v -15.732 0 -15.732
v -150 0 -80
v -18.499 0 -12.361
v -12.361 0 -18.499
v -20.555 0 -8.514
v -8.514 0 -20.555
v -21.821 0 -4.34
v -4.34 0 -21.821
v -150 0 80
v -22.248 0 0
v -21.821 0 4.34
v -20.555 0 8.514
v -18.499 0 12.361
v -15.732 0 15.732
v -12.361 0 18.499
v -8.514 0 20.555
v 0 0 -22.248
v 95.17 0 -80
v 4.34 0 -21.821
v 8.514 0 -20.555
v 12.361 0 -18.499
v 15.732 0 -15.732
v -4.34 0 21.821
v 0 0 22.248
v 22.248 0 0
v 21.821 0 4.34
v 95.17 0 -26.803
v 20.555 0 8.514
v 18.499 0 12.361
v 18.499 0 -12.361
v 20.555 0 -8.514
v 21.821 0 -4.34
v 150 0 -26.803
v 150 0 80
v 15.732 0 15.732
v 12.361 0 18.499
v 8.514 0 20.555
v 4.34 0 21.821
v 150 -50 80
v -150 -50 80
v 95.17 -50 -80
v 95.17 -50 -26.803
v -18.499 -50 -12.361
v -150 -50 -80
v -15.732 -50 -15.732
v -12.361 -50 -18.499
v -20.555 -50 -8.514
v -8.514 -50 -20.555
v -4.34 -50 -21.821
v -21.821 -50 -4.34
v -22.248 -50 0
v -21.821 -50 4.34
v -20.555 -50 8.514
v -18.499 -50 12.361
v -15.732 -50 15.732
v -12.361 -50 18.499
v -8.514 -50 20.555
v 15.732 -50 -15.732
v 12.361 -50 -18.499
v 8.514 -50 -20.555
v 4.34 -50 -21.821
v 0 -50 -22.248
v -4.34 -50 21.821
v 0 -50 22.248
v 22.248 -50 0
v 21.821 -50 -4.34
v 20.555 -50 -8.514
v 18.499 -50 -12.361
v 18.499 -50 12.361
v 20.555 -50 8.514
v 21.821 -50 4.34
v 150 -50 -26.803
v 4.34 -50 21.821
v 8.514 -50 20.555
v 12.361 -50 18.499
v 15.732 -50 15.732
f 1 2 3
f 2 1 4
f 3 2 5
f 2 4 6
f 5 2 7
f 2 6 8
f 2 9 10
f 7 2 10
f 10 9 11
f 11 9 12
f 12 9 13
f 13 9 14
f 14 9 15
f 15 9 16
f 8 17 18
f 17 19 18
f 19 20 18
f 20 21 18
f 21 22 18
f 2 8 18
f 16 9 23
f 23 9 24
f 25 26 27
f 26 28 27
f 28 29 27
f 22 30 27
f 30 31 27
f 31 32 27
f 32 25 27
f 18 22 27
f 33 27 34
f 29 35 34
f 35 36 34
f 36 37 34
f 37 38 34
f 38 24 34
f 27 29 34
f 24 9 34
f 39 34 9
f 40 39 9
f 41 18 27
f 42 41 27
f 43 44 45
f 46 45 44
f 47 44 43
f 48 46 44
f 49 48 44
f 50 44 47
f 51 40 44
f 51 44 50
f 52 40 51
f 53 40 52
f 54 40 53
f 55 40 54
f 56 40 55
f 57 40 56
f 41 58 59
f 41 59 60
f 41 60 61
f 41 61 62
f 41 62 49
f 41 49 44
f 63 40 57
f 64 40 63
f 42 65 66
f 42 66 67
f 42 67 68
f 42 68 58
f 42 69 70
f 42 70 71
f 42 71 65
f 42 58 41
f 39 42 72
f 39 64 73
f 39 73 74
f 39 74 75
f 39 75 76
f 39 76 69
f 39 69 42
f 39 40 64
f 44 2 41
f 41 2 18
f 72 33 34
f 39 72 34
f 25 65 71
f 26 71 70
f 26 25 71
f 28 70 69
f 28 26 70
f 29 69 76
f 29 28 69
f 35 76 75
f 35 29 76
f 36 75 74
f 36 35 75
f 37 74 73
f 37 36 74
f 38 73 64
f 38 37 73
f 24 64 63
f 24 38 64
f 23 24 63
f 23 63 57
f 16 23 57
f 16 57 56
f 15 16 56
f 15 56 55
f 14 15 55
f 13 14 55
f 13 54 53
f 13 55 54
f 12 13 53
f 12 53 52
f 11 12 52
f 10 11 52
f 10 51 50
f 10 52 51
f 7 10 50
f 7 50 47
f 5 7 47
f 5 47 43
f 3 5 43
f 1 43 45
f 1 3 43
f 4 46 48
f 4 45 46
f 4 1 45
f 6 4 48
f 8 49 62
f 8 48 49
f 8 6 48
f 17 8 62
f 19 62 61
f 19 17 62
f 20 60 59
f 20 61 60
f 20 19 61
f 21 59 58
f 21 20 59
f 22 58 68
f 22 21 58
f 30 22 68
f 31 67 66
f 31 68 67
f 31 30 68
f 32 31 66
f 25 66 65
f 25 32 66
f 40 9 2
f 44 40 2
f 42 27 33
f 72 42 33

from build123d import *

# Parameters (mm, degrees)
F1_DEPTH = 50
F2_R     = 22.248347
F3_DEPTH = 50.001


with BuildPart() as f1:
    # F0 (on Front) → F1 (new body)
    with BuildSketch(Plane.XZ):
        Polygon((-150, -80), (95.169887, -80), (95.169887, -26.802706), (150, -26.802706), (150, 80), (-150, 80), align=None)
    extrude(amount=F1_DEPTH)

    # F2 (on Front) → F3 (cut, through all)
    with BuildSketch(Plane.XZ):
        Circle(F2_R)
    extrude(amount=F3_DEPTH, mode=Mode.SUBTRACT)


solid = f1.part
